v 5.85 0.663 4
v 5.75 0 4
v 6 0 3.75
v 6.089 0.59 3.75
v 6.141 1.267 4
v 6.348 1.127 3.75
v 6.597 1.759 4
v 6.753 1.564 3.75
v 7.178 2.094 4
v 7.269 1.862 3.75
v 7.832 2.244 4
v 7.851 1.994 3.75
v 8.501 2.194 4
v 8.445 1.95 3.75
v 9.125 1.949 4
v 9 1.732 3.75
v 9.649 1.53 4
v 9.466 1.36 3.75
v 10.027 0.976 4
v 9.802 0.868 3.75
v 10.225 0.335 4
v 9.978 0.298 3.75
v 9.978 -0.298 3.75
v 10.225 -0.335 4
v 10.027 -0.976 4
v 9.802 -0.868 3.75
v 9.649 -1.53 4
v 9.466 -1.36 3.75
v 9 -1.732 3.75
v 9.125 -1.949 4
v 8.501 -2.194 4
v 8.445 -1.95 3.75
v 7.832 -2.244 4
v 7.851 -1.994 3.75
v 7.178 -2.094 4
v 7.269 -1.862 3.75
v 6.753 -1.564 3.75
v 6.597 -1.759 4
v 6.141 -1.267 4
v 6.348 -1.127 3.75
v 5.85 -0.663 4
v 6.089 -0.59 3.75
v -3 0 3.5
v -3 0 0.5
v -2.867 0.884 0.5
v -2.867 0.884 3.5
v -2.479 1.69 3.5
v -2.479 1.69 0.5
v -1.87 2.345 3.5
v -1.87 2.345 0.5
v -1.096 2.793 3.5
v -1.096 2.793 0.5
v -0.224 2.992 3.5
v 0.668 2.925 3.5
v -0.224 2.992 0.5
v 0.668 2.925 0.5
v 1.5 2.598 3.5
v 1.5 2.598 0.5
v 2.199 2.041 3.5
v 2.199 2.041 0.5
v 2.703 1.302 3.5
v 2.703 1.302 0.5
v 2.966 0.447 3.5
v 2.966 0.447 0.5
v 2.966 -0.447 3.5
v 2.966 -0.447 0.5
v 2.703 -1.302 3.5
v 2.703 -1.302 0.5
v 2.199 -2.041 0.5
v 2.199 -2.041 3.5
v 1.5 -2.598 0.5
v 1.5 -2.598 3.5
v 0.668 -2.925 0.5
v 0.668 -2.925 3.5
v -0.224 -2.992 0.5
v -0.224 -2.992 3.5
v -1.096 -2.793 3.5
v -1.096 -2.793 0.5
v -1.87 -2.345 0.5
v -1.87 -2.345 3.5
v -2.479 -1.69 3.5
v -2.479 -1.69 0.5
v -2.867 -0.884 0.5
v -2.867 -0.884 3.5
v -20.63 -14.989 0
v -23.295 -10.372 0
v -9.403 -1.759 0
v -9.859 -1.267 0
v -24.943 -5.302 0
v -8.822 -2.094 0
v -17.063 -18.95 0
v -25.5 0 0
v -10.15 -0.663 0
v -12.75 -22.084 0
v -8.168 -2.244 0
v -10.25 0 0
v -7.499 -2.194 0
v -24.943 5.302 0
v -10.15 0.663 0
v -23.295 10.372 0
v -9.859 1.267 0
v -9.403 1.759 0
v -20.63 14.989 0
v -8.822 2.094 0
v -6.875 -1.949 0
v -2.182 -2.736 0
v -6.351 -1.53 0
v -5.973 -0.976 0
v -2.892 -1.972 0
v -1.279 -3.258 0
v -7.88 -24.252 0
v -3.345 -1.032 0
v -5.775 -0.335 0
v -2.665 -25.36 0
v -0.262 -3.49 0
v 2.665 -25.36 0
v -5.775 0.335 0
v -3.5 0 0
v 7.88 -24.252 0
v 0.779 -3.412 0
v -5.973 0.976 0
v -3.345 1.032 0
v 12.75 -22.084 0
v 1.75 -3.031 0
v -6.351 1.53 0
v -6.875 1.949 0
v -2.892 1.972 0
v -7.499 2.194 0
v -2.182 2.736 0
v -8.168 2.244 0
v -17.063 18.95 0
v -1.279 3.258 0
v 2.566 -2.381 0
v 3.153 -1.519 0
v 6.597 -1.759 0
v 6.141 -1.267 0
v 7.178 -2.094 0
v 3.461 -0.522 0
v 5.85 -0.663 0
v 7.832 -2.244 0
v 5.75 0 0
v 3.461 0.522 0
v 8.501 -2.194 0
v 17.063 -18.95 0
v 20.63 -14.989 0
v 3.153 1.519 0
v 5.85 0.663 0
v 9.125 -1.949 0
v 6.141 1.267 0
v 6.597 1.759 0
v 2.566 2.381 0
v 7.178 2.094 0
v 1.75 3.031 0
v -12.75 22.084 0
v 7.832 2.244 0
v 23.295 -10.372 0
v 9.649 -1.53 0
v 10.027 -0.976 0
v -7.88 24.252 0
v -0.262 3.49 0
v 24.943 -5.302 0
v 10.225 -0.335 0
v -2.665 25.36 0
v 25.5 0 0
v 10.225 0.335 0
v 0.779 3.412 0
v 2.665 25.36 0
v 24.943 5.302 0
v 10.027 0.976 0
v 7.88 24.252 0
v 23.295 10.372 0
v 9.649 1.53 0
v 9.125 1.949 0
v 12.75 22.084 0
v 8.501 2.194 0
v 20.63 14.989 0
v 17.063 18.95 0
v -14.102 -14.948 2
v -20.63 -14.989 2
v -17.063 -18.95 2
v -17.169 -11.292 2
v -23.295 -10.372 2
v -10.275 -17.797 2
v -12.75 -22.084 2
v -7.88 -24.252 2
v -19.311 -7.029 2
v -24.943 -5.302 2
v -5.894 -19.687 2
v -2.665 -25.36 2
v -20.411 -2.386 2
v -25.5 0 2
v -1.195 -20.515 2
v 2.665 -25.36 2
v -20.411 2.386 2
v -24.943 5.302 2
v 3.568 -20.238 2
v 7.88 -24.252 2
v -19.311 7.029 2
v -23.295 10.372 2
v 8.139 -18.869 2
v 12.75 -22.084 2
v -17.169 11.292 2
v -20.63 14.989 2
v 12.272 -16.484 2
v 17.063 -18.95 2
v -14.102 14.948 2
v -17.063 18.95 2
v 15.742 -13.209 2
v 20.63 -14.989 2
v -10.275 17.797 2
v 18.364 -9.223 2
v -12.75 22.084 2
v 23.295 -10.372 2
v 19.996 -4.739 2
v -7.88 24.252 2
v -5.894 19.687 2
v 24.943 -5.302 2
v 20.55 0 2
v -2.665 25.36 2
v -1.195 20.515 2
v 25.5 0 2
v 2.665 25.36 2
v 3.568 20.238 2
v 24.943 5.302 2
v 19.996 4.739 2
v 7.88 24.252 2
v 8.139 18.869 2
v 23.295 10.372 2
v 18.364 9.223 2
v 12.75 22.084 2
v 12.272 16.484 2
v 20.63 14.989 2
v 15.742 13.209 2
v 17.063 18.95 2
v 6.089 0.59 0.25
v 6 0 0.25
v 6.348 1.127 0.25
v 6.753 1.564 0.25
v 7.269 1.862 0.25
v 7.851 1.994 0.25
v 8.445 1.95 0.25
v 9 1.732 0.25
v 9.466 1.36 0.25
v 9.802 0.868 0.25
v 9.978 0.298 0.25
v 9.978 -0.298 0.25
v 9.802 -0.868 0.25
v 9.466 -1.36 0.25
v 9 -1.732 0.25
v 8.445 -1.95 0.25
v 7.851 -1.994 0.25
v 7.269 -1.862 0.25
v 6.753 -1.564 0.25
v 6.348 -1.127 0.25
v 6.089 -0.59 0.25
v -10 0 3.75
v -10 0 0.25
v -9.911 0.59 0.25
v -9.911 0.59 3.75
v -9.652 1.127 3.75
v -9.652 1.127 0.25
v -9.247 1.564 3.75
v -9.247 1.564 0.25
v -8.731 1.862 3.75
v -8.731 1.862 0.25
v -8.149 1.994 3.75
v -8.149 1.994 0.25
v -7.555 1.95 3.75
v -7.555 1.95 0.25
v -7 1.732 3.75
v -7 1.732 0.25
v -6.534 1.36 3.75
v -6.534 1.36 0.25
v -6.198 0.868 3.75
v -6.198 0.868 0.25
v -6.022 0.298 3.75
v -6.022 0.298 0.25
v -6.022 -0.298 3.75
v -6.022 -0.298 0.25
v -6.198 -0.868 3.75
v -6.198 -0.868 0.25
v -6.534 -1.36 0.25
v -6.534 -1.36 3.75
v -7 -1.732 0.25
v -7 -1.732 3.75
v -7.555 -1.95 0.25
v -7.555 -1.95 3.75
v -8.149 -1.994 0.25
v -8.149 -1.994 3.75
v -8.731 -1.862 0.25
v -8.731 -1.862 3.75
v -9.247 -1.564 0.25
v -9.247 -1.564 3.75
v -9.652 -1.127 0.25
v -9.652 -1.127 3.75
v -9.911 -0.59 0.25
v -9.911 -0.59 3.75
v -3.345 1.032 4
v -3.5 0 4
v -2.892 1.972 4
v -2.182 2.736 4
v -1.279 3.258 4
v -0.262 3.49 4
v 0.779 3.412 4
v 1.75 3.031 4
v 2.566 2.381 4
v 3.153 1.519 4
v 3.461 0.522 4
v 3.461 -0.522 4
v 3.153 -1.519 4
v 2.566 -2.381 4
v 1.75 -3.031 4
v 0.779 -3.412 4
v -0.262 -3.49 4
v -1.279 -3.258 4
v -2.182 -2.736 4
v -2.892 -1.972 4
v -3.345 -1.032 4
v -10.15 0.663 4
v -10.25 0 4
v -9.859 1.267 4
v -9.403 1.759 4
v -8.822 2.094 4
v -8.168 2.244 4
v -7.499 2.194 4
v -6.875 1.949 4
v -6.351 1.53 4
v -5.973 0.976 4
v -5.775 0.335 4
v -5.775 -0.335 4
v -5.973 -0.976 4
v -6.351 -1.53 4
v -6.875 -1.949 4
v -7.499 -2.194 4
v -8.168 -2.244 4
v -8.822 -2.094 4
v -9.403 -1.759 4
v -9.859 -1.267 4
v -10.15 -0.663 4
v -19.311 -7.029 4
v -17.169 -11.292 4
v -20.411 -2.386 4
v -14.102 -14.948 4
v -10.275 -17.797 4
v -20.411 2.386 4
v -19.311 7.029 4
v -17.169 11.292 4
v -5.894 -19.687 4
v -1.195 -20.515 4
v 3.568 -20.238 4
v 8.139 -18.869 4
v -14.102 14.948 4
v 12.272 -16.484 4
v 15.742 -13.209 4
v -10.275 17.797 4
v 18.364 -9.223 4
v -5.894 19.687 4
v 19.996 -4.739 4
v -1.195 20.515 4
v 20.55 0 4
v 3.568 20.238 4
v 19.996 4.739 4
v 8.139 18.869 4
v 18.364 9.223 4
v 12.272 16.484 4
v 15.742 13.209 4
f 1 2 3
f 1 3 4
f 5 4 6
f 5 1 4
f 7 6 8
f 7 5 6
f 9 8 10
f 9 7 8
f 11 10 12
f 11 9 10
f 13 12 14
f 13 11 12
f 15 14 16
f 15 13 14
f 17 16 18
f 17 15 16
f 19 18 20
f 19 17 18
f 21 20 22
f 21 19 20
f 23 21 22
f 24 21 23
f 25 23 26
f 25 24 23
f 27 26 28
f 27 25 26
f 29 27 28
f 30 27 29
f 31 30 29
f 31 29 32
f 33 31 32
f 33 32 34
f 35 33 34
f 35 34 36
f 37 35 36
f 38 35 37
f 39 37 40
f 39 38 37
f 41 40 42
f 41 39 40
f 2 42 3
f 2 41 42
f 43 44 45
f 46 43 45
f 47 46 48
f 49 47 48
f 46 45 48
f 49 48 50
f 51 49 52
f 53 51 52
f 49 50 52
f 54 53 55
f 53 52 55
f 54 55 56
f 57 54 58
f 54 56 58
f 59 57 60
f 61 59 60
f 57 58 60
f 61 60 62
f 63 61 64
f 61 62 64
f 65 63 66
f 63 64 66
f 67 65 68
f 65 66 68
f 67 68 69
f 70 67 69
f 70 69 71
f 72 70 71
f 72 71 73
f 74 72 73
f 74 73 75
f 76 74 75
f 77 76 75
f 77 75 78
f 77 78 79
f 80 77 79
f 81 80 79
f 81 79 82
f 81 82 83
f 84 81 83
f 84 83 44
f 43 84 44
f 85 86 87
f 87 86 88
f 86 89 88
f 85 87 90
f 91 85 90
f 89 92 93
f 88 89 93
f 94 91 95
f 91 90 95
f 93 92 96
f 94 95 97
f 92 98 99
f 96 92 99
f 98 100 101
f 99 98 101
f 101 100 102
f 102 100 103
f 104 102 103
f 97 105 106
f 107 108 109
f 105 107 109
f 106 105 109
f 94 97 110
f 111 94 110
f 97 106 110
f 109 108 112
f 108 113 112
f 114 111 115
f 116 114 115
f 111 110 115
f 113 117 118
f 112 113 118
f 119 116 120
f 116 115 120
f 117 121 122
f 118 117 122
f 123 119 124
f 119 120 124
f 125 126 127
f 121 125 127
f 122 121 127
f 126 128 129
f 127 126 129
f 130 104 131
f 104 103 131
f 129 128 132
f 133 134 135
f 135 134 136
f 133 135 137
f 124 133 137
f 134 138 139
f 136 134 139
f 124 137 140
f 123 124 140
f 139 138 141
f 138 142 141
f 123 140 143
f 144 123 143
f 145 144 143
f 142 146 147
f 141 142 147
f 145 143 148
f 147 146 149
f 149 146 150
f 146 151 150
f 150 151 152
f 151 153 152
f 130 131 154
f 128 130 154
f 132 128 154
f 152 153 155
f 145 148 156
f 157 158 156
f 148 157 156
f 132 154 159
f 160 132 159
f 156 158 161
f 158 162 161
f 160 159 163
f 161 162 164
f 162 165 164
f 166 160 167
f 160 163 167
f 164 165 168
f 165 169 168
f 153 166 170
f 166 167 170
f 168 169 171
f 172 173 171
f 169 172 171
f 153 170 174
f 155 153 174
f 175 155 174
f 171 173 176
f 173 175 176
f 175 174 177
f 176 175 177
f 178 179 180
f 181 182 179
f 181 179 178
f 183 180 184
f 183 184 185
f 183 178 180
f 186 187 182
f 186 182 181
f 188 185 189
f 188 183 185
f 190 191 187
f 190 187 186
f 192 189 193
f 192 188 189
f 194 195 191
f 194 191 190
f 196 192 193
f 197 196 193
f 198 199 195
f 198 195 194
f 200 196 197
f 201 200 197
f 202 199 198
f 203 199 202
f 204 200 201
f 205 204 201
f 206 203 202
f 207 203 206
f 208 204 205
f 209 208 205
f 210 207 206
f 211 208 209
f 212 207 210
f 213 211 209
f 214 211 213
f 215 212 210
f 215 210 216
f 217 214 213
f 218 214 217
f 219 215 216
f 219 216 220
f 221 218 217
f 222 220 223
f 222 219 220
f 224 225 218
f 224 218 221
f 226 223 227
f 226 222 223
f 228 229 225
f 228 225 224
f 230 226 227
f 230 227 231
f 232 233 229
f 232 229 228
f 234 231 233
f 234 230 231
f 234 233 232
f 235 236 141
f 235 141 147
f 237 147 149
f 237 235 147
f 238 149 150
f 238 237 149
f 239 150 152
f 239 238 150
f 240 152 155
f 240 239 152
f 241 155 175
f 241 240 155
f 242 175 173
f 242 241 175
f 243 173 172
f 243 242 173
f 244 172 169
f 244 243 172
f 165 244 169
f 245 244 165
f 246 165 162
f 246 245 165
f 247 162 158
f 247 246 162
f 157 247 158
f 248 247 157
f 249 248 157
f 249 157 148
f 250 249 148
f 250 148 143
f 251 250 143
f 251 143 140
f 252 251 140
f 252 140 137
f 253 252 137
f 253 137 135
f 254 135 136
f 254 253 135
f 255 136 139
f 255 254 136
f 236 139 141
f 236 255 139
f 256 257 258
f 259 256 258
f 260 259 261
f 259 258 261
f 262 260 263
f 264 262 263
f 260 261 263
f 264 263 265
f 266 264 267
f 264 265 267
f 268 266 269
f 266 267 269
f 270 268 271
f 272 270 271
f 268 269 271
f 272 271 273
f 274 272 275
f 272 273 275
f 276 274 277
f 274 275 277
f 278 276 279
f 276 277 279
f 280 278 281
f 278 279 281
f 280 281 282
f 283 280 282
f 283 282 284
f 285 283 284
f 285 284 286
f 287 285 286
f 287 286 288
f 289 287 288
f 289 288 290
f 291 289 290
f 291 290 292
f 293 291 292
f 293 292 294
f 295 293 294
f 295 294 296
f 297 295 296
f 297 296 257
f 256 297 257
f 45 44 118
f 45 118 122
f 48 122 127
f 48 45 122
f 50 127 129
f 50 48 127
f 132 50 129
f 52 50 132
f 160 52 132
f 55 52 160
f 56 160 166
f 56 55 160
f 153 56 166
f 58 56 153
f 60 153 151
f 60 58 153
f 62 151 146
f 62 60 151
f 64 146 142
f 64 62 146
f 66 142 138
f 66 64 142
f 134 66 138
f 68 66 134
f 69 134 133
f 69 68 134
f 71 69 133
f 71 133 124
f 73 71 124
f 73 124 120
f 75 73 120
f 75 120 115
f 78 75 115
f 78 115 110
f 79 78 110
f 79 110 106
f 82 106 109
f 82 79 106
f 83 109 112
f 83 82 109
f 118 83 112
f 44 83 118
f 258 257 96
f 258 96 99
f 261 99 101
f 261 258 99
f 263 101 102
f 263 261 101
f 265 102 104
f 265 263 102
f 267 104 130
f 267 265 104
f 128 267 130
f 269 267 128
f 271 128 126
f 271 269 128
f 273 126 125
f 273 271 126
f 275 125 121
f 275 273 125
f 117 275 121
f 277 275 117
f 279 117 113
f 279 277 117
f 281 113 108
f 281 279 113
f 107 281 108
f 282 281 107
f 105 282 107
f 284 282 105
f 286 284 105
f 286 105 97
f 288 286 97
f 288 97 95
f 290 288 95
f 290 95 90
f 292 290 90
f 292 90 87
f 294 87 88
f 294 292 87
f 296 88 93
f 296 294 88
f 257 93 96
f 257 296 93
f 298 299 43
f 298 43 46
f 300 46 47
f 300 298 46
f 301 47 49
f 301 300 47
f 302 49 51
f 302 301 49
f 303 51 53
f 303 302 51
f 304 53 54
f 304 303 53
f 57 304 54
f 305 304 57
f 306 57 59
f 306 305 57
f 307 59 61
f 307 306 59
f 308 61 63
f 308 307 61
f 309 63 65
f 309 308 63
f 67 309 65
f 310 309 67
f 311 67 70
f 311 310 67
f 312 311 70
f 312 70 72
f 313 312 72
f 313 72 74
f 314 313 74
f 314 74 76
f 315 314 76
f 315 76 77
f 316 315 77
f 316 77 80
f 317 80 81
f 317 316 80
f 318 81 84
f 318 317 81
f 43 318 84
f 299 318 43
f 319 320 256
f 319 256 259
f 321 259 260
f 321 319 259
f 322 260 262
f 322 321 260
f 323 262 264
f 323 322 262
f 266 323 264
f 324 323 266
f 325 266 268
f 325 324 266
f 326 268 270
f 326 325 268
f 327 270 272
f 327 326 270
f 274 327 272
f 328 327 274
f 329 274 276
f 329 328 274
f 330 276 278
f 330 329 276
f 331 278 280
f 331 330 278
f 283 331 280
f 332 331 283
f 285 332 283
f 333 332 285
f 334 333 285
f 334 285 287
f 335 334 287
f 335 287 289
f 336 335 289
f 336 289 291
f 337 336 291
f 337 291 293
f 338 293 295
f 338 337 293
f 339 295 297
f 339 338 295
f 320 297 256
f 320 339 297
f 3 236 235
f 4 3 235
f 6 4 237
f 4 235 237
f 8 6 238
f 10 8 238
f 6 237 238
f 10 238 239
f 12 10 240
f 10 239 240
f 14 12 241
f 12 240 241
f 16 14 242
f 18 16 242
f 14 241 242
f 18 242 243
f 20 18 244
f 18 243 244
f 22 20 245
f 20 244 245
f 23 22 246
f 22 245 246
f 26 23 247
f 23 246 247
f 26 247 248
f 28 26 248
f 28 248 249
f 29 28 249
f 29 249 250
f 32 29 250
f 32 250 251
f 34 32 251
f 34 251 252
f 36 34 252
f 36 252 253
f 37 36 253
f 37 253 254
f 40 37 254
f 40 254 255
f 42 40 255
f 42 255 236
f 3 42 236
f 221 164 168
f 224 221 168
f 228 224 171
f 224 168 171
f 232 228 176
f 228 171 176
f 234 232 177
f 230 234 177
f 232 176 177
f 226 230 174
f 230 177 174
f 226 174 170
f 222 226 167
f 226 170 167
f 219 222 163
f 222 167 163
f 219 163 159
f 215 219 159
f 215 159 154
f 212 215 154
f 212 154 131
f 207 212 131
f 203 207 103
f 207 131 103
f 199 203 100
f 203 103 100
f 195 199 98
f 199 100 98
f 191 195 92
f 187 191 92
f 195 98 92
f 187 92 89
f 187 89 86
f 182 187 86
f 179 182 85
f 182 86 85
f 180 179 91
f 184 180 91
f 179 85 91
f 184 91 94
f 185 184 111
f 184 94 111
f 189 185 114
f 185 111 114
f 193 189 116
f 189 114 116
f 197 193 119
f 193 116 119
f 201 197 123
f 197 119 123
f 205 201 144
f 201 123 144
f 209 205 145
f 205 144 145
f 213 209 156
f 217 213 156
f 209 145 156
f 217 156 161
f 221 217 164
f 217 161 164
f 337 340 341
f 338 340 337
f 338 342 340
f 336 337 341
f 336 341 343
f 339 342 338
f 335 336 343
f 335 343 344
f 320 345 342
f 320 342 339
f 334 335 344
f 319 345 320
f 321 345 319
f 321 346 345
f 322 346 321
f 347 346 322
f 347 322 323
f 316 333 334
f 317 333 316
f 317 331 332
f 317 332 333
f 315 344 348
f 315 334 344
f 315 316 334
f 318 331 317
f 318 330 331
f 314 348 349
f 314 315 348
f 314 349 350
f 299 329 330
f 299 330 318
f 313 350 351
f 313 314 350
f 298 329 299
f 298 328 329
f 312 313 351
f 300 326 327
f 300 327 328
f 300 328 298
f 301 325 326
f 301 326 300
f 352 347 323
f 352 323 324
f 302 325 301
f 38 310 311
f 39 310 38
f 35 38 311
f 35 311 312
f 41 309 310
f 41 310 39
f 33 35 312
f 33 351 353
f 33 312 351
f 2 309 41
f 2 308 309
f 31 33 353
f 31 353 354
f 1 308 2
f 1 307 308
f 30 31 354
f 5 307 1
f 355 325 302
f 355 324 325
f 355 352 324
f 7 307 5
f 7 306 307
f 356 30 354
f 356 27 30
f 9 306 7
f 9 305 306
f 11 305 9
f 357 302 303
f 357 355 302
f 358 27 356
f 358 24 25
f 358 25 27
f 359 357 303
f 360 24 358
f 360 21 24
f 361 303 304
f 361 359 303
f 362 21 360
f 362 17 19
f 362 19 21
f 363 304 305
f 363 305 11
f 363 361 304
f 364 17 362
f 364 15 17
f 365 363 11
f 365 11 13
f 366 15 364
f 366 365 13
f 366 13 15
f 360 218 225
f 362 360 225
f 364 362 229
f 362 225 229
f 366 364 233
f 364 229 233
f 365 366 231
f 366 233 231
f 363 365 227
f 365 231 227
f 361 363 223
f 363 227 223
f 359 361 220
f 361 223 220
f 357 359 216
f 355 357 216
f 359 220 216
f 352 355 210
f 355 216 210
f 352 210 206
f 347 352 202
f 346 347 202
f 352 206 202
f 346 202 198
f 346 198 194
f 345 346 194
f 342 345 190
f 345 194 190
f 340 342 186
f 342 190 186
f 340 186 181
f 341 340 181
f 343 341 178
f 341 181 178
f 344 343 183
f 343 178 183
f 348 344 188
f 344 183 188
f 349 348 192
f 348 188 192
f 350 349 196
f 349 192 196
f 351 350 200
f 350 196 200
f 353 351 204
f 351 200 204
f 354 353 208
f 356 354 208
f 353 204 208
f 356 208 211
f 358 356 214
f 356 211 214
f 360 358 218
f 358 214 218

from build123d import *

# Parameters (mm, degrees)
SKETCH1_R           = 25.5
BOSS_EXTRUDE1_DEPTH = 2
SKETCH2_R           = 20.55
BOSS_EXTRUDE2_DEPTH = 2
SKETCH3_R           = 3
SKETCH3_R_2         = 2
CUT_EXTRUDE1_DEPTH  = 5
CHAMFER1_SIZE       = 0.25
CHAMFER2_SIZE       = 0.25
CHAMFER3_SIZE       = 0.5


with BuildPart() as part:
    # Sketch1 → Boss-Extrude1 (new body)
    with BuildSketch(Plane.XY):
        Circle(SKETCH1_R)
    extrude(amount=BOSS_EXTRUDE1_DEPTH)

    # Sketch2 → Boss-Extrude2 (add)
    with BuildSketch(Plane.XY.offset(2)):
        Circle(SKETCH2_R)
    extrude(amount=BOSS_EXTRUDE2_DEPTH)

    # Sketch3 → Cut-Extrude1 (cut, through all)
    with BuildSketch(Plane(origin=(0, 0, 0), x_dir=(-1, 0, 0), z_dir=(0, 0, -1))):
        Circle(SKETCH3_R)
        with Locations((8, 0)):
            Circle(SKETCH3_R_2)
        with Locations((-8, 0)):
            Circle(SKETCH3_R_2)
    extrude(amount=-CUT_EXTRUDE1_DEPTH, mode=Mode.SUBTRACT)

    # Chamfer1
    chamfer1_edges = [part.edges().sort_by_distance(p)[0] for p in [
        (10, 0, 4),
        (10, 0, 0),
    ]]
    chamfer(chamfer1_edges, length=CHAMFER1_SIZE)

    # Chamfer2
    chamfer2_edges = [part.edges().sort_by_distance(p)[0] for p in [
        (-6, 0, 4),
        (-6, 0, 0),
    ]]
    chamfer(chamfer2_edges, length=CHAMFER2_SIZE)

    # Chamfer3
    chamfer3_edges = [part.edges().sort_by_distance(p)[0] for p in [
        (3, 0, 4),
        (3, 0, 0),
    ]]
    chamfer(chamfer3_edges, length=CHAMFER3_SIZE)


solid = part.part
